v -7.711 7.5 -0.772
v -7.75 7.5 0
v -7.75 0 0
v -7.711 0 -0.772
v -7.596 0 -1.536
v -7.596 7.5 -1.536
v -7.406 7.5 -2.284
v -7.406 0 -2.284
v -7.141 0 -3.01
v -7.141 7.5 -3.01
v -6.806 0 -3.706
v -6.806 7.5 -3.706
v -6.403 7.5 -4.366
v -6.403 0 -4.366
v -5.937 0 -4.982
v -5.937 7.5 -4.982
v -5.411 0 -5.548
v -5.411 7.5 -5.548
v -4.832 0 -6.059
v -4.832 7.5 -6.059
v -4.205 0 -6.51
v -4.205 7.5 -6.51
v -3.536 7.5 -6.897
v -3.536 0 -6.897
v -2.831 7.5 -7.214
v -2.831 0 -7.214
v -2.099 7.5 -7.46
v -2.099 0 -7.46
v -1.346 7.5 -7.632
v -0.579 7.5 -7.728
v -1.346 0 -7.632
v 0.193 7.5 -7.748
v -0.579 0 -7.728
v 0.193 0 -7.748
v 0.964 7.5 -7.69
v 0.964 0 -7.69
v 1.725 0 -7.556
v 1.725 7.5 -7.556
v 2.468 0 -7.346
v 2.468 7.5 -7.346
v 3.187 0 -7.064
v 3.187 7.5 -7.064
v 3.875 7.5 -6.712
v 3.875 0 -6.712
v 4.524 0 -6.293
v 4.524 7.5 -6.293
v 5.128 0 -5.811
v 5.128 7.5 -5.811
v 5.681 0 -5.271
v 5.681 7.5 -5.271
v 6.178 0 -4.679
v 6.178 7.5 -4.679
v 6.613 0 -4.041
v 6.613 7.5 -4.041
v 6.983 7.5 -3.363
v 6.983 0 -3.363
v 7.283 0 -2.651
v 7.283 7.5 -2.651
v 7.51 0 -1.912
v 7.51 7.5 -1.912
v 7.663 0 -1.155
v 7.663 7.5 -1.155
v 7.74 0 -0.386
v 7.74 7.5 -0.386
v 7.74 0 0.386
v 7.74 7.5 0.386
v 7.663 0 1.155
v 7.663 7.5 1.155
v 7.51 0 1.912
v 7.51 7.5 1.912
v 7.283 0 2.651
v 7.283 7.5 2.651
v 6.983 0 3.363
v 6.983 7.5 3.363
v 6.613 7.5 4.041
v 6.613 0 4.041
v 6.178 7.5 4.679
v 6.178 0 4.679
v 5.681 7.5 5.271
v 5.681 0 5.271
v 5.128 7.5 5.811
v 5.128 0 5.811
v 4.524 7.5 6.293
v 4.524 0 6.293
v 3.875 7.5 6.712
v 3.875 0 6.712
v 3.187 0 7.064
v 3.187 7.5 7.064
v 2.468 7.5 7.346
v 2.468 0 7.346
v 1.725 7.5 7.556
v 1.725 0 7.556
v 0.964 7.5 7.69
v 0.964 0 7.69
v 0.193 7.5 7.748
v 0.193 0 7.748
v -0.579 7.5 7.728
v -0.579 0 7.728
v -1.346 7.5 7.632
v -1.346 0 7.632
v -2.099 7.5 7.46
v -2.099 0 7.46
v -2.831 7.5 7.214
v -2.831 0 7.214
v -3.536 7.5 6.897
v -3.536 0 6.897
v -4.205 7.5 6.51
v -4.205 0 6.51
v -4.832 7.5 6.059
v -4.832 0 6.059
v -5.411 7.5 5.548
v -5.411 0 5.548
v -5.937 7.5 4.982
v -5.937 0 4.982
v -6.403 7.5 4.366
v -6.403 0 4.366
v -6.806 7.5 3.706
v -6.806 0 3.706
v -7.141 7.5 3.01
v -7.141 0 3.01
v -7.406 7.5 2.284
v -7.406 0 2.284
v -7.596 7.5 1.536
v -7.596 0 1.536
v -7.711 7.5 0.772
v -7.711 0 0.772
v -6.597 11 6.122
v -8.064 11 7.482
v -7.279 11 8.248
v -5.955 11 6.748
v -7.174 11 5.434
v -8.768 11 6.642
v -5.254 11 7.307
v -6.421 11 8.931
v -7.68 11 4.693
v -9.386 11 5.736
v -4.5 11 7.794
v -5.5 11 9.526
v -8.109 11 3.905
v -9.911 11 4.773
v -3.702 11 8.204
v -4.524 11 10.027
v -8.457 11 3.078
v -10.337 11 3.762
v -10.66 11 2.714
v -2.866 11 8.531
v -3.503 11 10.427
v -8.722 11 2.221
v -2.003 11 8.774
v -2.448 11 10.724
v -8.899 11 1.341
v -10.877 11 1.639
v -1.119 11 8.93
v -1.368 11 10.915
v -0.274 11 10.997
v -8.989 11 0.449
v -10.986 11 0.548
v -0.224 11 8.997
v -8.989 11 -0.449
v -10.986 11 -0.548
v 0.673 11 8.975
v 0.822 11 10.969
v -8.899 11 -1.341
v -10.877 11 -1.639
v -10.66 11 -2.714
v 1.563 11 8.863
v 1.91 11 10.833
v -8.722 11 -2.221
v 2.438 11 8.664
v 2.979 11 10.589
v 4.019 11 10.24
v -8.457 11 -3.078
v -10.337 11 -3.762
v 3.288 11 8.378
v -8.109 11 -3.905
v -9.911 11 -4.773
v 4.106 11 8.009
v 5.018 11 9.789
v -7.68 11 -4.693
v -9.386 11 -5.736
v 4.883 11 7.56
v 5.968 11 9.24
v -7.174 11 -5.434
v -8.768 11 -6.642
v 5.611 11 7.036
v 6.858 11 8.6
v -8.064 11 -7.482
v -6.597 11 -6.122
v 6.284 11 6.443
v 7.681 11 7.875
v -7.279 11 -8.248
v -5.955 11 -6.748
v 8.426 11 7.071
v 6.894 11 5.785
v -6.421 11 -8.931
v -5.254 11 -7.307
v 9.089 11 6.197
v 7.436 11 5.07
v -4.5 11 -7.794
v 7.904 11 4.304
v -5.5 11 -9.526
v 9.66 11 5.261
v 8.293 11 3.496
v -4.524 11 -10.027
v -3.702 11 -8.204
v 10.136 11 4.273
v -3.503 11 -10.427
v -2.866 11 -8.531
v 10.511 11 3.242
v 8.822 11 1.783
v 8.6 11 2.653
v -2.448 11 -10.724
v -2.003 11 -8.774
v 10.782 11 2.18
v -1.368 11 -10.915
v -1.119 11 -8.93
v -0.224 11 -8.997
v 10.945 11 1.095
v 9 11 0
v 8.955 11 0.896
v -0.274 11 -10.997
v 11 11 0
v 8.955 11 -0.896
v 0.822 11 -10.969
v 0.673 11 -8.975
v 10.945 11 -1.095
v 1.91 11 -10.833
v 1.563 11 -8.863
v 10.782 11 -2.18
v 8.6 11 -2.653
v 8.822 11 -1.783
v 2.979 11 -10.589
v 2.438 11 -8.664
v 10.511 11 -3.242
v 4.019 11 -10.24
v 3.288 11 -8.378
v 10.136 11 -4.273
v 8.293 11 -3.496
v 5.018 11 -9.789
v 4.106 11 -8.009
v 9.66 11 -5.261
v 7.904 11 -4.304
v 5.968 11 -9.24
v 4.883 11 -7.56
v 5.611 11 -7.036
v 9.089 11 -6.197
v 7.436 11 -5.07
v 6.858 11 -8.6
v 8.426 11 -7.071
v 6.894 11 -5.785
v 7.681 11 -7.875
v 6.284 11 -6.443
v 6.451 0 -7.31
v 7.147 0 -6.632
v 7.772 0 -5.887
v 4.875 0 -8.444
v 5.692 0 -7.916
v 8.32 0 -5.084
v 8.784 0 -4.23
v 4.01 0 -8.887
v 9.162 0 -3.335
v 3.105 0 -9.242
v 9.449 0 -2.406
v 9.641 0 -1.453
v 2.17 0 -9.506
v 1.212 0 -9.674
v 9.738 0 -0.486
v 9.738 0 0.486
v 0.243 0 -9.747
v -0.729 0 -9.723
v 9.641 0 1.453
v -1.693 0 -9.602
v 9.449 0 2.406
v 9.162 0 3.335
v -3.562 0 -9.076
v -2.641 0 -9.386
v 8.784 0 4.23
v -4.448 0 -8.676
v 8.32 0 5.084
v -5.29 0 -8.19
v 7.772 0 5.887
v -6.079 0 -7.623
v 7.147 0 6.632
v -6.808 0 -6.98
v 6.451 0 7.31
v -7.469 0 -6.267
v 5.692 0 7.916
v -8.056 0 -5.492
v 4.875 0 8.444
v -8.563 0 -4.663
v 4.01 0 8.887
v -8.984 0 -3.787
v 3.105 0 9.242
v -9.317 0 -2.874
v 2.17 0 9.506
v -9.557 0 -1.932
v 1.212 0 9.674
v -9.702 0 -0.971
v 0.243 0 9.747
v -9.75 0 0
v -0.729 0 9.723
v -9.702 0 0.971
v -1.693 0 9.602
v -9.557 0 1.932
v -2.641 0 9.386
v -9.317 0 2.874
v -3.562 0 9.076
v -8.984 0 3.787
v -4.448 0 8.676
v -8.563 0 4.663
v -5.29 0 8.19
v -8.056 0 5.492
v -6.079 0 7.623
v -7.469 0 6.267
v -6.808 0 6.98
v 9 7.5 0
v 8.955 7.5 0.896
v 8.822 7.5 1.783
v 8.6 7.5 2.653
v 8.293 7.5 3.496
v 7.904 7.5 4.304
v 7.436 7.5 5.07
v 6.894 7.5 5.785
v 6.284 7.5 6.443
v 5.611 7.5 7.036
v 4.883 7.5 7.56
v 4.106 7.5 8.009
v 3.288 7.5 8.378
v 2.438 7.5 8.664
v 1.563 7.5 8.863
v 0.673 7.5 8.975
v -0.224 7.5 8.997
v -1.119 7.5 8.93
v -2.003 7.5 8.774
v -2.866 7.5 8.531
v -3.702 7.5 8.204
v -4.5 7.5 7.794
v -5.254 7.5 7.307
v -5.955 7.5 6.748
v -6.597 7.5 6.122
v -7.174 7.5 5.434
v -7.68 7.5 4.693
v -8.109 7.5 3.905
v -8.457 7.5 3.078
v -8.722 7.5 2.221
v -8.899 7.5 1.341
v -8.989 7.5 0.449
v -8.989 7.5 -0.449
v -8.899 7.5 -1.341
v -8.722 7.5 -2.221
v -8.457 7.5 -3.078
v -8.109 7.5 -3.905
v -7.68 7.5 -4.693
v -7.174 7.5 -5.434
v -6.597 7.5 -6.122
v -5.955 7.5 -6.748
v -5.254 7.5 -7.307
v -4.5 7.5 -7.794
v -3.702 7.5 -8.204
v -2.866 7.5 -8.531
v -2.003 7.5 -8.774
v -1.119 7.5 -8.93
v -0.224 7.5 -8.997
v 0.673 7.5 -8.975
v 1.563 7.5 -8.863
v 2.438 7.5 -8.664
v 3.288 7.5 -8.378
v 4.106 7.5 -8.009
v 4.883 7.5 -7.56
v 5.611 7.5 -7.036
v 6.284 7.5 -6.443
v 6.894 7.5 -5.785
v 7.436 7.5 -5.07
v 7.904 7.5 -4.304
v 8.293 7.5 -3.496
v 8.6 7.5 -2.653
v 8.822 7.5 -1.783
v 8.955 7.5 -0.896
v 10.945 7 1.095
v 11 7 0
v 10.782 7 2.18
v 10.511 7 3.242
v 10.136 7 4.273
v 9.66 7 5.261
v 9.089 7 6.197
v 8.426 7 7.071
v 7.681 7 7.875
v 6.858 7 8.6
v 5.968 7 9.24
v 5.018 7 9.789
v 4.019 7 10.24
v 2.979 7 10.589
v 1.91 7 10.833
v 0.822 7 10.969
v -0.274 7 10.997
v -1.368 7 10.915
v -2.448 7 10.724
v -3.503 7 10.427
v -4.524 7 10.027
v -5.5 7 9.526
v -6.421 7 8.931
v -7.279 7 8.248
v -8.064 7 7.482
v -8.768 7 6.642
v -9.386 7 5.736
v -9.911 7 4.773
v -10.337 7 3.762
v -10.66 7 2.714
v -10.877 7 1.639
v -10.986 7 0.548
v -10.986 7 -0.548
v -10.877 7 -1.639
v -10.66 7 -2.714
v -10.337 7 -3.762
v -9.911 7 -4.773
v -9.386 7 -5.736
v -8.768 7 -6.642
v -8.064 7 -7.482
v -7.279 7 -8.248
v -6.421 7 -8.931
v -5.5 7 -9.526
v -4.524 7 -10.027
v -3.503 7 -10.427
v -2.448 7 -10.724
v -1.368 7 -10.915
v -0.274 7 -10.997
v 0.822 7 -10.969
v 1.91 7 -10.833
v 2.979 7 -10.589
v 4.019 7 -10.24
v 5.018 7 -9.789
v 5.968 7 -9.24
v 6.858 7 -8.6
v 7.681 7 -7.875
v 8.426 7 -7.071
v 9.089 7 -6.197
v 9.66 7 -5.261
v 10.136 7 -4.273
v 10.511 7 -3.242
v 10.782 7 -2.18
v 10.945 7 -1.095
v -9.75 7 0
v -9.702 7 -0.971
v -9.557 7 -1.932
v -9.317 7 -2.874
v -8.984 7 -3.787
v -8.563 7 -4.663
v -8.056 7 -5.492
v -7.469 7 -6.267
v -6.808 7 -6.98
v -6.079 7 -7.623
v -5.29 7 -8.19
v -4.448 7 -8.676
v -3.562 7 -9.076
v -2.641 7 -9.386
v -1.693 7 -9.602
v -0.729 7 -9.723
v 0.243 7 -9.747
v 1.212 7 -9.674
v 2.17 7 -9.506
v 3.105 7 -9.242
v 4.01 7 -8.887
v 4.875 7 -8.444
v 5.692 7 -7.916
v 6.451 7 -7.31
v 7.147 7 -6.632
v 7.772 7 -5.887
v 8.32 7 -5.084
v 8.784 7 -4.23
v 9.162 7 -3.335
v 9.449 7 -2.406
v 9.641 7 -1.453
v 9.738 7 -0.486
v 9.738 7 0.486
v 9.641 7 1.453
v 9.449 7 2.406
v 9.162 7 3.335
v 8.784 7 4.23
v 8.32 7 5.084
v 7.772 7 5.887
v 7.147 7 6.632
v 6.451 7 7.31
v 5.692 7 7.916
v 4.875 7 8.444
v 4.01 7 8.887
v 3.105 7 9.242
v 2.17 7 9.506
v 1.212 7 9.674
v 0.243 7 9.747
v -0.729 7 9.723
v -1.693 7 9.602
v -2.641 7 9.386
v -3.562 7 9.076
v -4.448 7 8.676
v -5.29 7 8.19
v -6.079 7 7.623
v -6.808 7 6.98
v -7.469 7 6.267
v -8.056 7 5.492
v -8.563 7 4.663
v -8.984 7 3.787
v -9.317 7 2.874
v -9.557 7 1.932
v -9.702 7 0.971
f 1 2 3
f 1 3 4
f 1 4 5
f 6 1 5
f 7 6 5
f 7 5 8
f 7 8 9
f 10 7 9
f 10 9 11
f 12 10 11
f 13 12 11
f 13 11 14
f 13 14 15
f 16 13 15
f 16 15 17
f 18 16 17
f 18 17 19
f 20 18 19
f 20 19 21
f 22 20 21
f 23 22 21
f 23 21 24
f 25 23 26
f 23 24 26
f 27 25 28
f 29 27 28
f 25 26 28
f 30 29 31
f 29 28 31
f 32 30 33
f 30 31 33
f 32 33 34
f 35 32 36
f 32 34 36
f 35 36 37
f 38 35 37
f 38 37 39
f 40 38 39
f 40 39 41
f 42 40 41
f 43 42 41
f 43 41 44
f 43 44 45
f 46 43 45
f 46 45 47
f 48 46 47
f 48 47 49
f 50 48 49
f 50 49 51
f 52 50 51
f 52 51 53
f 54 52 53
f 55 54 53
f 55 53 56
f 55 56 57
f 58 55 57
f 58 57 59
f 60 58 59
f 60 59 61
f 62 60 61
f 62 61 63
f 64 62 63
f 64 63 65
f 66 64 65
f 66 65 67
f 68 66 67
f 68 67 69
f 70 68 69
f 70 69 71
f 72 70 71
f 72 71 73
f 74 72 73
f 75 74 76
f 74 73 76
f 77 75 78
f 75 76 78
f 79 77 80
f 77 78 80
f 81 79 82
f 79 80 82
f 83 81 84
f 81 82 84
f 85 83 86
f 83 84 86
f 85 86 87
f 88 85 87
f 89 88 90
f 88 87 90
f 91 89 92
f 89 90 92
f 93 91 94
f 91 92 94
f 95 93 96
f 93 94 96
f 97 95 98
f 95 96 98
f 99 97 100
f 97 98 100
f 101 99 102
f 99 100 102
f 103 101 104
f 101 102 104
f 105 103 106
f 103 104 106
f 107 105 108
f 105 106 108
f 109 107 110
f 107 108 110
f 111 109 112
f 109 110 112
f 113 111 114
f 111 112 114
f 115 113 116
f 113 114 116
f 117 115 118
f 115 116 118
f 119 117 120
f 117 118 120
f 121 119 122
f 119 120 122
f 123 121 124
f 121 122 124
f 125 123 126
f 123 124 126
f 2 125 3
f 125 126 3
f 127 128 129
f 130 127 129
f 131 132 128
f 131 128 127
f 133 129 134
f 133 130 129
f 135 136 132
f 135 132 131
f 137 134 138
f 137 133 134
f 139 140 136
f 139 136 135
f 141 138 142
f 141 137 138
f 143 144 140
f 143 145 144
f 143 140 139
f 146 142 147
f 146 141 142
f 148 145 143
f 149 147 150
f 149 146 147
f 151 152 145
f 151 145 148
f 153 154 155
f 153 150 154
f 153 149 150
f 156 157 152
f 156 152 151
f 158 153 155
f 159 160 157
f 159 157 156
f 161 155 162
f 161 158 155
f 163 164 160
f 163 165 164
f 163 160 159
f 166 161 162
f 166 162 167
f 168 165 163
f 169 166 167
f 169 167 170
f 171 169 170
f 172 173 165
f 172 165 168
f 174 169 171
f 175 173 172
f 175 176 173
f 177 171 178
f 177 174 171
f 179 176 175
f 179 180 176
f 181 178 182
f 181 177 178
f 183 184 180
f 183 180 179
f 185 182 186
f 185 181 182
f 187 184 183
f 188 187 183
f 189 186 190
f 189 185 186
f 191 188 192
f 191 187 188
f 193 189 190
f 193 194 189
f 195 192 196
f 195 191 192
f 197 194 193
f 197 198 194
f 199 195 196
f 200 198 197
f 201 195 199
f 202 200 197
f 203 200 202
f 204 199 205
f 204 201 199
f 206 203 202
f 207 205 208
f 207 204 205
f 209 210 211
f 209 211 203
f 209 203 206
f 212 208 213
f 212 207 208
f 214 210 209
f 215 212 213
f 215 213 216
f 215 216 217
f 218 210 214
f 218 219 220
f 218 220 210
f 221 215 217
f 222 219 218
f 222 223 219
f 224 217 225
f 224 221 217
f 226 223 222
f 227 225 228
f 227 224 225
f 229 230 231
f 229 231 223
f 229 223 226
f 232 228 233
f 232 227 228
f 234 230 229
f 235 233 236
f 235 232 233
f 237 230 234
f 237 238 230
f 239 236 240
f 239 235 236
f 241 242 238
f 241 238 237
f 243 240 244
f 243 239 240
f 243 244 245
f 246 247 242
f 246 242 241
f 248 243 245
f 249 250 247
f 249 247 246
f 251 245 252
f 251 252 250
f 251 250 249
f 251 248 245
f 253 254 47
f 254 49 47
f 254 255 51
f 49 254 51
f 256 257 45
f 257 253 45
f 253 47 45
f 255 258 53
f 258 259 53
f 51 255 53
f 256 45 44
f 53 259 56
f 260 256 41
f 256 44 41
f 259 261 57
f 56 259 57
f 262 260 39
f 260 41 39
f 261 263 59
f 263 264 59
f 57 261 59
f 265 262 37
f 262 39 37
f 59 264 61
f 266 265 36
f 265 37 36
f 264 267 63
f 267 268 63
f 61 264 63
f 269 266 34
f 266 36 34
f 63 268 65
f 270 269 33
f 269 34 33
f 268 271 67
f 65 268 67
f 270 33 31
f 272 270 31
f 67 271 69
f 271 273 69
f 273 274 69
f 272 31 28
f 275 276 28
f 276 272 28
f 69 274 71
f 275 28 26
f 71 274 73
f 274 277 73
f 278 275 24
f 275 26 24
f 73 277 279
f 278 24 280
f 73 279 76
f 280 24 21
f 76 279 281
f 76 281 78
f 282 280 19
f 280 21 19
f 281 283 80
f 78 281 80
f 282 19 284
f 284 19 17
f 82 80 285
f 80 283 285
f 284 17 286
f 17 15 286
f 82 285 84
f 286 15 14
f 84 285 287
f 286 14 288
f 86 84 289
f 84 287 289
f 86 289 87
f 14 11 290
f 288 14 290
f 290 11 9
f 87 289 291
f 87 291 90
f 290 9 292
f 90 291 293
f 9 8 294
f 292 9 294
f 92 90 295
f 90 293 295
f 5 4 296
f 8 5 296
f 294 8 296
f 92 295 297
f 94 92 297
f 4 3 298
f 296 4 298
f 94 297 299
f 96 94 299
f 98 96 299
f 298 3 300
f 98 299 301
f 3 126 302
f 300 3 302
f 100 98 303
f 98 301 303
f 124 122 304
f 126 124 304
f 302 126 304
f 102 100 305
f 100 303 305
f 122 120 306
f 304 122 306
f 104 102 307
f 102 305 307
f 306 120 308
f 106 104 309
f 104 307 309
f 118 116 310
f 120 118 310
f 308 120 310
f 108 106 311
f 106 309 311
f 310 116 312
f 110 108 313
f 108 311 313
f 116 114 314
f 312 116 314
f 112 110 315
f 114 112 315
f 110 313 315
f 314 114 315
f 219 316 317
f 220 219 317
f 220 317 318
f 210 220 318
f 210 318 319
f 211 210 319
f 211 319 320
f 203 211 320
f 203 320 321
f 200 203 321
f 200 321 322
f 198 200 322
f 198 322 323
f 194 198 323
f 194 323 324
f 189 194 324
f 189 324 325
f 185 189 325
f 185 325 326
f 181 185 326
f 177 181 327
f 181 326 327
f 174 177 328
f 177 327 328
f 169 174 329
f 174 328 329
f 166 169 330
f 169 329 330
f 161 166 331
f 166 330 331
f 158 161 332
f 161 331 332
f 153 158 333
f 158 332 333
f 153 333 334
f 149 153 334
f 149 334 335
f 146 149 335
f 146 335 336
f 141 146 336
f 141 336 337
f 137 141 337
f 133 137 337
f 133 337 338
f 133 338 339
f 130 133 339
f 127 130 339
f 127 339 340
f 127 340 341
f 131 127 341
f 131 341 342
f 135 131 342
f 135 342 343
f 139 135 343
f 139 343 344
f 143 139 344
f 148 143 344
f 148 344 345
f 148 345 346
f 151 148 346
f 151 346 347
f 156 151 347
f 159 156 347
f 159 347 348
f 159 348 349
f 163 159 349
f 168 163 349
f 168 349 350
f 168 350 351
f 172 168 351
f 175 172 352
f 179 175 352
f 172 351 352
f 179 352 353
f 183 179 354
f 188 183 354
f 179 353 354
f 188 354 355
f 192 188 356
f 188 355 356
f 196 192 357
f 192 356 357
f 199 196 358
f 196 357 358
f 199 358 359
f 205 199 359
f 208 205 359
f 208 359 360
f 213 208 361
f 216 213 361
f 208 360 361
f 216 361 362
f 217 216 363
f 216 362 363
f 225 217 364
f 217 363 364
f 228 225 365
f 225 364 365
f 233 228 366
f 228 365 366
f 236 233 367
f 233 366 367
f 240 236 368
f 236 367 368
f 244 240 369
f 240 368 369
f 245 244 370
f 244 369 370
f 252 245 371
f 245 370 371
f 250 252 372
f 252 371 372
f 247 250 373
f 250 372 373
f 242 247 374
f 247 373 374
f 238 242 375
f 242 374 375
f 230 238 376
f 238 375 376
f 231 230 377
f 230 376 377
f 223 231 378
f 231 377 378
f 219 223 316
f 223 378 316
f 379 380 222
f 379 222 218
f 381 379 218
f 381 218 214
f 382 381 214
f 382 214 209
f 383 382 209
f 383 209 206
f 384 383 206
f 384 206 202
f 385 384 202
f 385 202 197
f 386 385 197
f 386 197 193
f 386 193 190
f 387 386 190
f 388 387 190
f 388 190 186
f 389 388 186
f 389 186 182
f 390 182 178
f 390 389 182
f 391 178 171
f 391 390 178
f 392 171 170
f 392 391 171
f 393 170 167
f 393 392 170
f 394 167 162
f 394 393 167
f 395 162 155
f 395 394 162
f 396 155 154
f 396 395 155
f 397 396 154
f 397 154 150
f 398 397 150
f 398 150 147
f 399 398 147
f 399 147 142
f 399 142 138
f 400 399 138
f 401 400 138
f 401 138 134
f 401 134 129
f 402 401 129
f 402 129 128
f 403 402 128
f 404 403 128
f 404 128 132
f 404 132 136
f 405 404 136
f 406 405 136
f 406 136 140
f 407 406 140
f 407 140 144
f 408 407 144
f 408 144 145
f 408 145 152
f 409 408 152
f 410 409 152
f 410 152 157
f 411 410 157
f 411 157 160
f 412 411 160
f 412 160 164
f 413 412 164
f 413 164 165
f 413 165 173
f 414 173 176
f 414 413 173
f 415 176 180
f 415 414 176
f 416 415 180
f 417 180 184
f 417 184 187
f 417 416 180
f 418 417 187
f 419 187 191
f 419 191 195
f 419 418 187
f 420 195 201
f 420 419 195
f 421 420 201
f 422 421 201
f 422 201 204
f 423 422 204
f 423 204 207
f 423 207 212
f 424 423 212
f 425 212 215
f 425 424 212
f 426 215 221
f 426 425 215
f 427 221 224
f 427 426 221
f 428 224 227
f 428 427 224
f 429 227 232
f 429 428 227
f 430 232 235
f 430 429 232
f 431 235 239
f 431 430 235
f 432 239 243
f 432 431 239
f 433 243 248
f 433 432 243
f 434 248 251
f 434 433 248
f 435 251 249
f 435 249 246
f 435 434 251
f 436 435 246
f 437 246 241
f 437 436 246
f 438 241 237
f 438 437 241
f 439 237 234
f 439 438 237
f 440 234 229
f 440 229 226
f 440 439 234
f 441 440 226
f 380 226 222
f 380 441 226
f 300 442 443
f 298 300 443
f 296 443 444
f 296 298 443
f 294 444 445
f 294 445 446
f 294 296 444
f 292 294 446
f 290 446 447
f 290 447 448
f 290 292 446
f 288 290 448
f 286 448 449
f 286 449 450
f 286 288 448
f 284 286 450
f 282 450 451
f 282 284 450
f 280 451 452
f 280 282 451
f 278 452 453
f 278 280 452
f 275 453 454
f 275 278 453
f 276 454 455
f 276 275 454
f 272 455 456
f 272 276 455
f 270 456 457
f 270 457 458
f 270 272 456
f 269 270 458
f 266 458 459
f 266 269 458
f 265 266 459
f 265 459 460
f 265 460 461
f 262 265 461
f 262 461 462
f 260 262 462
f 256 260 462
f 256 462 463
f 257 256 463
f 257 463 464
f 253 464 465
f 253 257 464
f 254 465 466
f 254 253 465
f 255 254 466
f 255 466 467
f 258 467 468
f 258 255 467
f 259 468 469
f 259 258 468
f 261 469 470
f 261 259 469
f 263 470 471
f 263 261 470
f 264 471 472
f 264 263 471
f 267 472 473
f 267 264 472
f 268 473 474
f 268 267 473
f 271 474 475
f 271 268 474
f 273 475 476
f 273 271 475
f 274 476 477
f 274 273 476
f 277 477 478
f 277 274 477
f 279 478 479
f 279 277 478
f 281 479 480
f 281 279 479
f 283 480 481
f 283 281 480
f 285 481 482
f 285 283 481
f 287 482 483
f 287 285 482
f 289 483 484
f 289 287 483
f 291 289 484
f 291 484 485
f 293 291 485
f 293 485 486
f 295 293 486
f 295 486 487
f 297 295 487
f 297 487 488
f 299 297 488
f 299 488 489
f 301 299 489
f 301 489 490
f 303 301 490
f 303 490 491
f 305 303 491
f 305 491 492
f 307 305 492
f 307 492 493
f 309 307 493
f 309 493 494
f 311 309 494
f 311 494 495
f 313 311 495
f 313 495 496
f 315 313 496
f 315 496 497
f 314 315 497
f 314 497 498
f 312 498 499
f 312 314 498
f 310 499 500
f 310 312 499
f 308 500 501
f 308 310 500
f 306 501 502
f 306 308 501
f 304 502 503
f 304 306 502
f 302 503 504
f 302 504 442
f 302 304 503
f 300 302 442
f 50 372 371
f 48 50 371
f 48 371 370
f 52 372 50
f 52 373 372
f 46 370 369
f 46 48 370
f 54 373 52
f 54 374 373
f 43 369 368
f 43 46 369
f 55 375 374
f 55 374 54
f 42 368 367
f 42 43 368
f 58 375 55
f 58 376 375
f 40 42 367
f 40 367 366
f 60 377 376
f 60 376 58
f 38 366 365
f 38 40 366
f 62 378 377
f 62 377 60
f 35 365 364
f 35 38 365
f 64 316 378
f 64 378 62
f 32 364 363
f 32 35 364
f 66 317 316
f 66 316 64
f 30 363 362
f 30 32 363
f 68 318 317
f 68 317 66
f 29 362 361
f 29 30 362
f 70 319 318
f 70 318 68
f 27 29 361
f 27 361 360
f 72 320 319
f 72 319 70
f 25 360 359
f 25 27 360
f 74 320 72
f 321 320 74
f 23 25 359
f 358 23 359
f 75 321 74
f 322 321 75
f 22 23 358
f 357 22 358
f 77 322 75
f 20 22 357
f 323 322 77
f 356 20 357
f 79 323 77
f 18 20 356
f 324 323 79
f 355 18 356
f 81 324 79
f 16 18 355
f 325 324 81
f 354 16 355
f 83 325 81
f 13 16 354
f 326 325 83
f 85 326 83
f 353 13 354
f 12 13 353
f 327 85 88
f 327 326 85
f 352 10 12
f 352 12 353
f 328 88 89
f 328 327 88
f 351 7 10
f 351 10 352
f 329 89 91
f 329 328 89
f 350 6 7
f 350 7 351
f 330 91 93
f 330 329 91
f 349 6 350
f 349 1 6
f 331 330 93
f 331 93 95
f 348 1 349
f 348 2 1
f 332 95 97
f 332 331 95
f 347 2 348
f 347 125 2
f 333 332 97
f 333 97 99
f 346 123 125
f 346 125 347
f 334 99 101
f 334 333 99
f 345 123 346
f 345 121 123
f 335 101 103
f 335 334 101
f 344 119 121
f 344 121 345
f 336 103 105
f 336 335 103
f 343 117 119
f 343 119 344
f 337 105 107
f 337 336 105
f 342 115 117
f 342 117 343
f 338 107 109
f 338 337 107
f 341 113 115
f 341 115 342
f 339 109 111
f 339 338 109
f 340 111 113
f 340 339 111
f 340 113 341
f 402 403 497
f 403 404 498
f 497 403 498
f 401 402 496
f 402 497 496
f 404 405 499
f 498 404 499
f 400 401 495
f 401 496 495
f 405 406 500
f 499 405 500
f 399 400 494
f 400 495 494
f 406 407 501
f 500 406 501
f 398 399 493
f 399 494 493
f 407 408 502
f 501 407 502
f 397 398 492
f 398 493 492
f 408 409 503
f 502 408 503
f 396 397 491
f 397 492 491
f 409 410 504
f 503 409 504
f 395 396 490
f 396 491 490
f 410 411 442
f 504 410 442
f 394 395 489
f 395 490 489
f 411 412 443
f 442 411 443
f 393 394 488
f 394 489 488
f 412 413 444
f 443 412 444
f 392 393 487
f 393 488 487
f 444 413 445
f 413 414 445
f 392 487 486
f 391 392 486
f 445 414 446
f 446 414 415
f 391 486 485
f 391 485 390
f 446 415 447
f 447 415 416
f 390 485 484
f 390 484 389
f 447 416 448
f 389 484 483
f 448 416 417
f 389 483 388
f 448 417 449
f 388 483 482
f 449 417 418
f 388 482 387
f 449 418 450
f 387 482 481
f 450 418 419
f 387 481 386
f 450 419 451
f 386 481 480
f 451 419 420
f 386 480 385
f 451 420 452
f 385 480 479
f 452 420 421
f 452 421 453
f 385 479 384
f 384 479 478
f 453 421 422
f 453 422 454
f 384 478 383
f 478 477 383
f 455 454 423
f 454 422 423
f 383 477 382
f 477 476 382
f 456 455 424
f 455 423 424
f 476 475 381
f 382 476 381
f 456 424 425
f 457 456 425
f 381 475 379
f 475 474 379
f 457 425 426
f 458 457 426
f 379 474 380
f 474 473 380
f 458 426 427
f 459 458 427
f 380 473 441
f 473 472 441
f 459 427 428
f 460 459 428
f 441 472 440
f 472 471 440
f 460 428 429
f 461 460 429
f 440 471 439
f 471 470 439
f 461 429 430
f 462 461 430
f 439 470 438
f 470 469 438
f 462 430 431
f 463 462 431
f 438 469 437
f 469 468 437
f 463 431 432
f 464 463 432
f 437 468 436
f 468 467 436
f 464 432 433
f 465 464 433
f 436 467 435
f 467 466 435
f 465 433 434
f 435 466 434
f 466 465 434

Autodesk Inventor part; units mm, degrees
ref_plane "YZ Plane" through (0, 0, 0) normal (1, 0, 0) x (0, 1, 0)
ref_plane "XZ Plane" through (0, 0, 0) normal (0, 1, 0) x (-1, 0, 0)
ref_plane "XY Plane" through (0, 0, 0) normal (0, 0, 1) x (1, 0, 0)
sketch "Sketch1" plane through (0, 0, 0) normal (0, 1, 0) x (-1, 0, 0)
  circle A0 centre (0, 0) radius 7.75
  circle A1 centre (0, 0) radius 9.75
  dimension "d0" = 15.5
  dimension "d1" = 19.5
extrude "Extrusion1" add sketch "Sketch1" along normal blind 7
sketch "Sketch5" plane through (0, 7, 0) normal (0, 1, 0) x (1, 0, 0)
  circle A0 centre (0, 0) radius 11
  circle A1 centre (0, 0) radius 9
  dimension "d13" = 22
  dimension "d14" = 18
extrude "Extrusion5" add sketch "Sketch5" along normal blind 4
move faces "Move1" translate (0, 0.5, 0) faces at (8.4211, 7, 1.3362)
properties part number "685ZZFlanged_Adapter"
